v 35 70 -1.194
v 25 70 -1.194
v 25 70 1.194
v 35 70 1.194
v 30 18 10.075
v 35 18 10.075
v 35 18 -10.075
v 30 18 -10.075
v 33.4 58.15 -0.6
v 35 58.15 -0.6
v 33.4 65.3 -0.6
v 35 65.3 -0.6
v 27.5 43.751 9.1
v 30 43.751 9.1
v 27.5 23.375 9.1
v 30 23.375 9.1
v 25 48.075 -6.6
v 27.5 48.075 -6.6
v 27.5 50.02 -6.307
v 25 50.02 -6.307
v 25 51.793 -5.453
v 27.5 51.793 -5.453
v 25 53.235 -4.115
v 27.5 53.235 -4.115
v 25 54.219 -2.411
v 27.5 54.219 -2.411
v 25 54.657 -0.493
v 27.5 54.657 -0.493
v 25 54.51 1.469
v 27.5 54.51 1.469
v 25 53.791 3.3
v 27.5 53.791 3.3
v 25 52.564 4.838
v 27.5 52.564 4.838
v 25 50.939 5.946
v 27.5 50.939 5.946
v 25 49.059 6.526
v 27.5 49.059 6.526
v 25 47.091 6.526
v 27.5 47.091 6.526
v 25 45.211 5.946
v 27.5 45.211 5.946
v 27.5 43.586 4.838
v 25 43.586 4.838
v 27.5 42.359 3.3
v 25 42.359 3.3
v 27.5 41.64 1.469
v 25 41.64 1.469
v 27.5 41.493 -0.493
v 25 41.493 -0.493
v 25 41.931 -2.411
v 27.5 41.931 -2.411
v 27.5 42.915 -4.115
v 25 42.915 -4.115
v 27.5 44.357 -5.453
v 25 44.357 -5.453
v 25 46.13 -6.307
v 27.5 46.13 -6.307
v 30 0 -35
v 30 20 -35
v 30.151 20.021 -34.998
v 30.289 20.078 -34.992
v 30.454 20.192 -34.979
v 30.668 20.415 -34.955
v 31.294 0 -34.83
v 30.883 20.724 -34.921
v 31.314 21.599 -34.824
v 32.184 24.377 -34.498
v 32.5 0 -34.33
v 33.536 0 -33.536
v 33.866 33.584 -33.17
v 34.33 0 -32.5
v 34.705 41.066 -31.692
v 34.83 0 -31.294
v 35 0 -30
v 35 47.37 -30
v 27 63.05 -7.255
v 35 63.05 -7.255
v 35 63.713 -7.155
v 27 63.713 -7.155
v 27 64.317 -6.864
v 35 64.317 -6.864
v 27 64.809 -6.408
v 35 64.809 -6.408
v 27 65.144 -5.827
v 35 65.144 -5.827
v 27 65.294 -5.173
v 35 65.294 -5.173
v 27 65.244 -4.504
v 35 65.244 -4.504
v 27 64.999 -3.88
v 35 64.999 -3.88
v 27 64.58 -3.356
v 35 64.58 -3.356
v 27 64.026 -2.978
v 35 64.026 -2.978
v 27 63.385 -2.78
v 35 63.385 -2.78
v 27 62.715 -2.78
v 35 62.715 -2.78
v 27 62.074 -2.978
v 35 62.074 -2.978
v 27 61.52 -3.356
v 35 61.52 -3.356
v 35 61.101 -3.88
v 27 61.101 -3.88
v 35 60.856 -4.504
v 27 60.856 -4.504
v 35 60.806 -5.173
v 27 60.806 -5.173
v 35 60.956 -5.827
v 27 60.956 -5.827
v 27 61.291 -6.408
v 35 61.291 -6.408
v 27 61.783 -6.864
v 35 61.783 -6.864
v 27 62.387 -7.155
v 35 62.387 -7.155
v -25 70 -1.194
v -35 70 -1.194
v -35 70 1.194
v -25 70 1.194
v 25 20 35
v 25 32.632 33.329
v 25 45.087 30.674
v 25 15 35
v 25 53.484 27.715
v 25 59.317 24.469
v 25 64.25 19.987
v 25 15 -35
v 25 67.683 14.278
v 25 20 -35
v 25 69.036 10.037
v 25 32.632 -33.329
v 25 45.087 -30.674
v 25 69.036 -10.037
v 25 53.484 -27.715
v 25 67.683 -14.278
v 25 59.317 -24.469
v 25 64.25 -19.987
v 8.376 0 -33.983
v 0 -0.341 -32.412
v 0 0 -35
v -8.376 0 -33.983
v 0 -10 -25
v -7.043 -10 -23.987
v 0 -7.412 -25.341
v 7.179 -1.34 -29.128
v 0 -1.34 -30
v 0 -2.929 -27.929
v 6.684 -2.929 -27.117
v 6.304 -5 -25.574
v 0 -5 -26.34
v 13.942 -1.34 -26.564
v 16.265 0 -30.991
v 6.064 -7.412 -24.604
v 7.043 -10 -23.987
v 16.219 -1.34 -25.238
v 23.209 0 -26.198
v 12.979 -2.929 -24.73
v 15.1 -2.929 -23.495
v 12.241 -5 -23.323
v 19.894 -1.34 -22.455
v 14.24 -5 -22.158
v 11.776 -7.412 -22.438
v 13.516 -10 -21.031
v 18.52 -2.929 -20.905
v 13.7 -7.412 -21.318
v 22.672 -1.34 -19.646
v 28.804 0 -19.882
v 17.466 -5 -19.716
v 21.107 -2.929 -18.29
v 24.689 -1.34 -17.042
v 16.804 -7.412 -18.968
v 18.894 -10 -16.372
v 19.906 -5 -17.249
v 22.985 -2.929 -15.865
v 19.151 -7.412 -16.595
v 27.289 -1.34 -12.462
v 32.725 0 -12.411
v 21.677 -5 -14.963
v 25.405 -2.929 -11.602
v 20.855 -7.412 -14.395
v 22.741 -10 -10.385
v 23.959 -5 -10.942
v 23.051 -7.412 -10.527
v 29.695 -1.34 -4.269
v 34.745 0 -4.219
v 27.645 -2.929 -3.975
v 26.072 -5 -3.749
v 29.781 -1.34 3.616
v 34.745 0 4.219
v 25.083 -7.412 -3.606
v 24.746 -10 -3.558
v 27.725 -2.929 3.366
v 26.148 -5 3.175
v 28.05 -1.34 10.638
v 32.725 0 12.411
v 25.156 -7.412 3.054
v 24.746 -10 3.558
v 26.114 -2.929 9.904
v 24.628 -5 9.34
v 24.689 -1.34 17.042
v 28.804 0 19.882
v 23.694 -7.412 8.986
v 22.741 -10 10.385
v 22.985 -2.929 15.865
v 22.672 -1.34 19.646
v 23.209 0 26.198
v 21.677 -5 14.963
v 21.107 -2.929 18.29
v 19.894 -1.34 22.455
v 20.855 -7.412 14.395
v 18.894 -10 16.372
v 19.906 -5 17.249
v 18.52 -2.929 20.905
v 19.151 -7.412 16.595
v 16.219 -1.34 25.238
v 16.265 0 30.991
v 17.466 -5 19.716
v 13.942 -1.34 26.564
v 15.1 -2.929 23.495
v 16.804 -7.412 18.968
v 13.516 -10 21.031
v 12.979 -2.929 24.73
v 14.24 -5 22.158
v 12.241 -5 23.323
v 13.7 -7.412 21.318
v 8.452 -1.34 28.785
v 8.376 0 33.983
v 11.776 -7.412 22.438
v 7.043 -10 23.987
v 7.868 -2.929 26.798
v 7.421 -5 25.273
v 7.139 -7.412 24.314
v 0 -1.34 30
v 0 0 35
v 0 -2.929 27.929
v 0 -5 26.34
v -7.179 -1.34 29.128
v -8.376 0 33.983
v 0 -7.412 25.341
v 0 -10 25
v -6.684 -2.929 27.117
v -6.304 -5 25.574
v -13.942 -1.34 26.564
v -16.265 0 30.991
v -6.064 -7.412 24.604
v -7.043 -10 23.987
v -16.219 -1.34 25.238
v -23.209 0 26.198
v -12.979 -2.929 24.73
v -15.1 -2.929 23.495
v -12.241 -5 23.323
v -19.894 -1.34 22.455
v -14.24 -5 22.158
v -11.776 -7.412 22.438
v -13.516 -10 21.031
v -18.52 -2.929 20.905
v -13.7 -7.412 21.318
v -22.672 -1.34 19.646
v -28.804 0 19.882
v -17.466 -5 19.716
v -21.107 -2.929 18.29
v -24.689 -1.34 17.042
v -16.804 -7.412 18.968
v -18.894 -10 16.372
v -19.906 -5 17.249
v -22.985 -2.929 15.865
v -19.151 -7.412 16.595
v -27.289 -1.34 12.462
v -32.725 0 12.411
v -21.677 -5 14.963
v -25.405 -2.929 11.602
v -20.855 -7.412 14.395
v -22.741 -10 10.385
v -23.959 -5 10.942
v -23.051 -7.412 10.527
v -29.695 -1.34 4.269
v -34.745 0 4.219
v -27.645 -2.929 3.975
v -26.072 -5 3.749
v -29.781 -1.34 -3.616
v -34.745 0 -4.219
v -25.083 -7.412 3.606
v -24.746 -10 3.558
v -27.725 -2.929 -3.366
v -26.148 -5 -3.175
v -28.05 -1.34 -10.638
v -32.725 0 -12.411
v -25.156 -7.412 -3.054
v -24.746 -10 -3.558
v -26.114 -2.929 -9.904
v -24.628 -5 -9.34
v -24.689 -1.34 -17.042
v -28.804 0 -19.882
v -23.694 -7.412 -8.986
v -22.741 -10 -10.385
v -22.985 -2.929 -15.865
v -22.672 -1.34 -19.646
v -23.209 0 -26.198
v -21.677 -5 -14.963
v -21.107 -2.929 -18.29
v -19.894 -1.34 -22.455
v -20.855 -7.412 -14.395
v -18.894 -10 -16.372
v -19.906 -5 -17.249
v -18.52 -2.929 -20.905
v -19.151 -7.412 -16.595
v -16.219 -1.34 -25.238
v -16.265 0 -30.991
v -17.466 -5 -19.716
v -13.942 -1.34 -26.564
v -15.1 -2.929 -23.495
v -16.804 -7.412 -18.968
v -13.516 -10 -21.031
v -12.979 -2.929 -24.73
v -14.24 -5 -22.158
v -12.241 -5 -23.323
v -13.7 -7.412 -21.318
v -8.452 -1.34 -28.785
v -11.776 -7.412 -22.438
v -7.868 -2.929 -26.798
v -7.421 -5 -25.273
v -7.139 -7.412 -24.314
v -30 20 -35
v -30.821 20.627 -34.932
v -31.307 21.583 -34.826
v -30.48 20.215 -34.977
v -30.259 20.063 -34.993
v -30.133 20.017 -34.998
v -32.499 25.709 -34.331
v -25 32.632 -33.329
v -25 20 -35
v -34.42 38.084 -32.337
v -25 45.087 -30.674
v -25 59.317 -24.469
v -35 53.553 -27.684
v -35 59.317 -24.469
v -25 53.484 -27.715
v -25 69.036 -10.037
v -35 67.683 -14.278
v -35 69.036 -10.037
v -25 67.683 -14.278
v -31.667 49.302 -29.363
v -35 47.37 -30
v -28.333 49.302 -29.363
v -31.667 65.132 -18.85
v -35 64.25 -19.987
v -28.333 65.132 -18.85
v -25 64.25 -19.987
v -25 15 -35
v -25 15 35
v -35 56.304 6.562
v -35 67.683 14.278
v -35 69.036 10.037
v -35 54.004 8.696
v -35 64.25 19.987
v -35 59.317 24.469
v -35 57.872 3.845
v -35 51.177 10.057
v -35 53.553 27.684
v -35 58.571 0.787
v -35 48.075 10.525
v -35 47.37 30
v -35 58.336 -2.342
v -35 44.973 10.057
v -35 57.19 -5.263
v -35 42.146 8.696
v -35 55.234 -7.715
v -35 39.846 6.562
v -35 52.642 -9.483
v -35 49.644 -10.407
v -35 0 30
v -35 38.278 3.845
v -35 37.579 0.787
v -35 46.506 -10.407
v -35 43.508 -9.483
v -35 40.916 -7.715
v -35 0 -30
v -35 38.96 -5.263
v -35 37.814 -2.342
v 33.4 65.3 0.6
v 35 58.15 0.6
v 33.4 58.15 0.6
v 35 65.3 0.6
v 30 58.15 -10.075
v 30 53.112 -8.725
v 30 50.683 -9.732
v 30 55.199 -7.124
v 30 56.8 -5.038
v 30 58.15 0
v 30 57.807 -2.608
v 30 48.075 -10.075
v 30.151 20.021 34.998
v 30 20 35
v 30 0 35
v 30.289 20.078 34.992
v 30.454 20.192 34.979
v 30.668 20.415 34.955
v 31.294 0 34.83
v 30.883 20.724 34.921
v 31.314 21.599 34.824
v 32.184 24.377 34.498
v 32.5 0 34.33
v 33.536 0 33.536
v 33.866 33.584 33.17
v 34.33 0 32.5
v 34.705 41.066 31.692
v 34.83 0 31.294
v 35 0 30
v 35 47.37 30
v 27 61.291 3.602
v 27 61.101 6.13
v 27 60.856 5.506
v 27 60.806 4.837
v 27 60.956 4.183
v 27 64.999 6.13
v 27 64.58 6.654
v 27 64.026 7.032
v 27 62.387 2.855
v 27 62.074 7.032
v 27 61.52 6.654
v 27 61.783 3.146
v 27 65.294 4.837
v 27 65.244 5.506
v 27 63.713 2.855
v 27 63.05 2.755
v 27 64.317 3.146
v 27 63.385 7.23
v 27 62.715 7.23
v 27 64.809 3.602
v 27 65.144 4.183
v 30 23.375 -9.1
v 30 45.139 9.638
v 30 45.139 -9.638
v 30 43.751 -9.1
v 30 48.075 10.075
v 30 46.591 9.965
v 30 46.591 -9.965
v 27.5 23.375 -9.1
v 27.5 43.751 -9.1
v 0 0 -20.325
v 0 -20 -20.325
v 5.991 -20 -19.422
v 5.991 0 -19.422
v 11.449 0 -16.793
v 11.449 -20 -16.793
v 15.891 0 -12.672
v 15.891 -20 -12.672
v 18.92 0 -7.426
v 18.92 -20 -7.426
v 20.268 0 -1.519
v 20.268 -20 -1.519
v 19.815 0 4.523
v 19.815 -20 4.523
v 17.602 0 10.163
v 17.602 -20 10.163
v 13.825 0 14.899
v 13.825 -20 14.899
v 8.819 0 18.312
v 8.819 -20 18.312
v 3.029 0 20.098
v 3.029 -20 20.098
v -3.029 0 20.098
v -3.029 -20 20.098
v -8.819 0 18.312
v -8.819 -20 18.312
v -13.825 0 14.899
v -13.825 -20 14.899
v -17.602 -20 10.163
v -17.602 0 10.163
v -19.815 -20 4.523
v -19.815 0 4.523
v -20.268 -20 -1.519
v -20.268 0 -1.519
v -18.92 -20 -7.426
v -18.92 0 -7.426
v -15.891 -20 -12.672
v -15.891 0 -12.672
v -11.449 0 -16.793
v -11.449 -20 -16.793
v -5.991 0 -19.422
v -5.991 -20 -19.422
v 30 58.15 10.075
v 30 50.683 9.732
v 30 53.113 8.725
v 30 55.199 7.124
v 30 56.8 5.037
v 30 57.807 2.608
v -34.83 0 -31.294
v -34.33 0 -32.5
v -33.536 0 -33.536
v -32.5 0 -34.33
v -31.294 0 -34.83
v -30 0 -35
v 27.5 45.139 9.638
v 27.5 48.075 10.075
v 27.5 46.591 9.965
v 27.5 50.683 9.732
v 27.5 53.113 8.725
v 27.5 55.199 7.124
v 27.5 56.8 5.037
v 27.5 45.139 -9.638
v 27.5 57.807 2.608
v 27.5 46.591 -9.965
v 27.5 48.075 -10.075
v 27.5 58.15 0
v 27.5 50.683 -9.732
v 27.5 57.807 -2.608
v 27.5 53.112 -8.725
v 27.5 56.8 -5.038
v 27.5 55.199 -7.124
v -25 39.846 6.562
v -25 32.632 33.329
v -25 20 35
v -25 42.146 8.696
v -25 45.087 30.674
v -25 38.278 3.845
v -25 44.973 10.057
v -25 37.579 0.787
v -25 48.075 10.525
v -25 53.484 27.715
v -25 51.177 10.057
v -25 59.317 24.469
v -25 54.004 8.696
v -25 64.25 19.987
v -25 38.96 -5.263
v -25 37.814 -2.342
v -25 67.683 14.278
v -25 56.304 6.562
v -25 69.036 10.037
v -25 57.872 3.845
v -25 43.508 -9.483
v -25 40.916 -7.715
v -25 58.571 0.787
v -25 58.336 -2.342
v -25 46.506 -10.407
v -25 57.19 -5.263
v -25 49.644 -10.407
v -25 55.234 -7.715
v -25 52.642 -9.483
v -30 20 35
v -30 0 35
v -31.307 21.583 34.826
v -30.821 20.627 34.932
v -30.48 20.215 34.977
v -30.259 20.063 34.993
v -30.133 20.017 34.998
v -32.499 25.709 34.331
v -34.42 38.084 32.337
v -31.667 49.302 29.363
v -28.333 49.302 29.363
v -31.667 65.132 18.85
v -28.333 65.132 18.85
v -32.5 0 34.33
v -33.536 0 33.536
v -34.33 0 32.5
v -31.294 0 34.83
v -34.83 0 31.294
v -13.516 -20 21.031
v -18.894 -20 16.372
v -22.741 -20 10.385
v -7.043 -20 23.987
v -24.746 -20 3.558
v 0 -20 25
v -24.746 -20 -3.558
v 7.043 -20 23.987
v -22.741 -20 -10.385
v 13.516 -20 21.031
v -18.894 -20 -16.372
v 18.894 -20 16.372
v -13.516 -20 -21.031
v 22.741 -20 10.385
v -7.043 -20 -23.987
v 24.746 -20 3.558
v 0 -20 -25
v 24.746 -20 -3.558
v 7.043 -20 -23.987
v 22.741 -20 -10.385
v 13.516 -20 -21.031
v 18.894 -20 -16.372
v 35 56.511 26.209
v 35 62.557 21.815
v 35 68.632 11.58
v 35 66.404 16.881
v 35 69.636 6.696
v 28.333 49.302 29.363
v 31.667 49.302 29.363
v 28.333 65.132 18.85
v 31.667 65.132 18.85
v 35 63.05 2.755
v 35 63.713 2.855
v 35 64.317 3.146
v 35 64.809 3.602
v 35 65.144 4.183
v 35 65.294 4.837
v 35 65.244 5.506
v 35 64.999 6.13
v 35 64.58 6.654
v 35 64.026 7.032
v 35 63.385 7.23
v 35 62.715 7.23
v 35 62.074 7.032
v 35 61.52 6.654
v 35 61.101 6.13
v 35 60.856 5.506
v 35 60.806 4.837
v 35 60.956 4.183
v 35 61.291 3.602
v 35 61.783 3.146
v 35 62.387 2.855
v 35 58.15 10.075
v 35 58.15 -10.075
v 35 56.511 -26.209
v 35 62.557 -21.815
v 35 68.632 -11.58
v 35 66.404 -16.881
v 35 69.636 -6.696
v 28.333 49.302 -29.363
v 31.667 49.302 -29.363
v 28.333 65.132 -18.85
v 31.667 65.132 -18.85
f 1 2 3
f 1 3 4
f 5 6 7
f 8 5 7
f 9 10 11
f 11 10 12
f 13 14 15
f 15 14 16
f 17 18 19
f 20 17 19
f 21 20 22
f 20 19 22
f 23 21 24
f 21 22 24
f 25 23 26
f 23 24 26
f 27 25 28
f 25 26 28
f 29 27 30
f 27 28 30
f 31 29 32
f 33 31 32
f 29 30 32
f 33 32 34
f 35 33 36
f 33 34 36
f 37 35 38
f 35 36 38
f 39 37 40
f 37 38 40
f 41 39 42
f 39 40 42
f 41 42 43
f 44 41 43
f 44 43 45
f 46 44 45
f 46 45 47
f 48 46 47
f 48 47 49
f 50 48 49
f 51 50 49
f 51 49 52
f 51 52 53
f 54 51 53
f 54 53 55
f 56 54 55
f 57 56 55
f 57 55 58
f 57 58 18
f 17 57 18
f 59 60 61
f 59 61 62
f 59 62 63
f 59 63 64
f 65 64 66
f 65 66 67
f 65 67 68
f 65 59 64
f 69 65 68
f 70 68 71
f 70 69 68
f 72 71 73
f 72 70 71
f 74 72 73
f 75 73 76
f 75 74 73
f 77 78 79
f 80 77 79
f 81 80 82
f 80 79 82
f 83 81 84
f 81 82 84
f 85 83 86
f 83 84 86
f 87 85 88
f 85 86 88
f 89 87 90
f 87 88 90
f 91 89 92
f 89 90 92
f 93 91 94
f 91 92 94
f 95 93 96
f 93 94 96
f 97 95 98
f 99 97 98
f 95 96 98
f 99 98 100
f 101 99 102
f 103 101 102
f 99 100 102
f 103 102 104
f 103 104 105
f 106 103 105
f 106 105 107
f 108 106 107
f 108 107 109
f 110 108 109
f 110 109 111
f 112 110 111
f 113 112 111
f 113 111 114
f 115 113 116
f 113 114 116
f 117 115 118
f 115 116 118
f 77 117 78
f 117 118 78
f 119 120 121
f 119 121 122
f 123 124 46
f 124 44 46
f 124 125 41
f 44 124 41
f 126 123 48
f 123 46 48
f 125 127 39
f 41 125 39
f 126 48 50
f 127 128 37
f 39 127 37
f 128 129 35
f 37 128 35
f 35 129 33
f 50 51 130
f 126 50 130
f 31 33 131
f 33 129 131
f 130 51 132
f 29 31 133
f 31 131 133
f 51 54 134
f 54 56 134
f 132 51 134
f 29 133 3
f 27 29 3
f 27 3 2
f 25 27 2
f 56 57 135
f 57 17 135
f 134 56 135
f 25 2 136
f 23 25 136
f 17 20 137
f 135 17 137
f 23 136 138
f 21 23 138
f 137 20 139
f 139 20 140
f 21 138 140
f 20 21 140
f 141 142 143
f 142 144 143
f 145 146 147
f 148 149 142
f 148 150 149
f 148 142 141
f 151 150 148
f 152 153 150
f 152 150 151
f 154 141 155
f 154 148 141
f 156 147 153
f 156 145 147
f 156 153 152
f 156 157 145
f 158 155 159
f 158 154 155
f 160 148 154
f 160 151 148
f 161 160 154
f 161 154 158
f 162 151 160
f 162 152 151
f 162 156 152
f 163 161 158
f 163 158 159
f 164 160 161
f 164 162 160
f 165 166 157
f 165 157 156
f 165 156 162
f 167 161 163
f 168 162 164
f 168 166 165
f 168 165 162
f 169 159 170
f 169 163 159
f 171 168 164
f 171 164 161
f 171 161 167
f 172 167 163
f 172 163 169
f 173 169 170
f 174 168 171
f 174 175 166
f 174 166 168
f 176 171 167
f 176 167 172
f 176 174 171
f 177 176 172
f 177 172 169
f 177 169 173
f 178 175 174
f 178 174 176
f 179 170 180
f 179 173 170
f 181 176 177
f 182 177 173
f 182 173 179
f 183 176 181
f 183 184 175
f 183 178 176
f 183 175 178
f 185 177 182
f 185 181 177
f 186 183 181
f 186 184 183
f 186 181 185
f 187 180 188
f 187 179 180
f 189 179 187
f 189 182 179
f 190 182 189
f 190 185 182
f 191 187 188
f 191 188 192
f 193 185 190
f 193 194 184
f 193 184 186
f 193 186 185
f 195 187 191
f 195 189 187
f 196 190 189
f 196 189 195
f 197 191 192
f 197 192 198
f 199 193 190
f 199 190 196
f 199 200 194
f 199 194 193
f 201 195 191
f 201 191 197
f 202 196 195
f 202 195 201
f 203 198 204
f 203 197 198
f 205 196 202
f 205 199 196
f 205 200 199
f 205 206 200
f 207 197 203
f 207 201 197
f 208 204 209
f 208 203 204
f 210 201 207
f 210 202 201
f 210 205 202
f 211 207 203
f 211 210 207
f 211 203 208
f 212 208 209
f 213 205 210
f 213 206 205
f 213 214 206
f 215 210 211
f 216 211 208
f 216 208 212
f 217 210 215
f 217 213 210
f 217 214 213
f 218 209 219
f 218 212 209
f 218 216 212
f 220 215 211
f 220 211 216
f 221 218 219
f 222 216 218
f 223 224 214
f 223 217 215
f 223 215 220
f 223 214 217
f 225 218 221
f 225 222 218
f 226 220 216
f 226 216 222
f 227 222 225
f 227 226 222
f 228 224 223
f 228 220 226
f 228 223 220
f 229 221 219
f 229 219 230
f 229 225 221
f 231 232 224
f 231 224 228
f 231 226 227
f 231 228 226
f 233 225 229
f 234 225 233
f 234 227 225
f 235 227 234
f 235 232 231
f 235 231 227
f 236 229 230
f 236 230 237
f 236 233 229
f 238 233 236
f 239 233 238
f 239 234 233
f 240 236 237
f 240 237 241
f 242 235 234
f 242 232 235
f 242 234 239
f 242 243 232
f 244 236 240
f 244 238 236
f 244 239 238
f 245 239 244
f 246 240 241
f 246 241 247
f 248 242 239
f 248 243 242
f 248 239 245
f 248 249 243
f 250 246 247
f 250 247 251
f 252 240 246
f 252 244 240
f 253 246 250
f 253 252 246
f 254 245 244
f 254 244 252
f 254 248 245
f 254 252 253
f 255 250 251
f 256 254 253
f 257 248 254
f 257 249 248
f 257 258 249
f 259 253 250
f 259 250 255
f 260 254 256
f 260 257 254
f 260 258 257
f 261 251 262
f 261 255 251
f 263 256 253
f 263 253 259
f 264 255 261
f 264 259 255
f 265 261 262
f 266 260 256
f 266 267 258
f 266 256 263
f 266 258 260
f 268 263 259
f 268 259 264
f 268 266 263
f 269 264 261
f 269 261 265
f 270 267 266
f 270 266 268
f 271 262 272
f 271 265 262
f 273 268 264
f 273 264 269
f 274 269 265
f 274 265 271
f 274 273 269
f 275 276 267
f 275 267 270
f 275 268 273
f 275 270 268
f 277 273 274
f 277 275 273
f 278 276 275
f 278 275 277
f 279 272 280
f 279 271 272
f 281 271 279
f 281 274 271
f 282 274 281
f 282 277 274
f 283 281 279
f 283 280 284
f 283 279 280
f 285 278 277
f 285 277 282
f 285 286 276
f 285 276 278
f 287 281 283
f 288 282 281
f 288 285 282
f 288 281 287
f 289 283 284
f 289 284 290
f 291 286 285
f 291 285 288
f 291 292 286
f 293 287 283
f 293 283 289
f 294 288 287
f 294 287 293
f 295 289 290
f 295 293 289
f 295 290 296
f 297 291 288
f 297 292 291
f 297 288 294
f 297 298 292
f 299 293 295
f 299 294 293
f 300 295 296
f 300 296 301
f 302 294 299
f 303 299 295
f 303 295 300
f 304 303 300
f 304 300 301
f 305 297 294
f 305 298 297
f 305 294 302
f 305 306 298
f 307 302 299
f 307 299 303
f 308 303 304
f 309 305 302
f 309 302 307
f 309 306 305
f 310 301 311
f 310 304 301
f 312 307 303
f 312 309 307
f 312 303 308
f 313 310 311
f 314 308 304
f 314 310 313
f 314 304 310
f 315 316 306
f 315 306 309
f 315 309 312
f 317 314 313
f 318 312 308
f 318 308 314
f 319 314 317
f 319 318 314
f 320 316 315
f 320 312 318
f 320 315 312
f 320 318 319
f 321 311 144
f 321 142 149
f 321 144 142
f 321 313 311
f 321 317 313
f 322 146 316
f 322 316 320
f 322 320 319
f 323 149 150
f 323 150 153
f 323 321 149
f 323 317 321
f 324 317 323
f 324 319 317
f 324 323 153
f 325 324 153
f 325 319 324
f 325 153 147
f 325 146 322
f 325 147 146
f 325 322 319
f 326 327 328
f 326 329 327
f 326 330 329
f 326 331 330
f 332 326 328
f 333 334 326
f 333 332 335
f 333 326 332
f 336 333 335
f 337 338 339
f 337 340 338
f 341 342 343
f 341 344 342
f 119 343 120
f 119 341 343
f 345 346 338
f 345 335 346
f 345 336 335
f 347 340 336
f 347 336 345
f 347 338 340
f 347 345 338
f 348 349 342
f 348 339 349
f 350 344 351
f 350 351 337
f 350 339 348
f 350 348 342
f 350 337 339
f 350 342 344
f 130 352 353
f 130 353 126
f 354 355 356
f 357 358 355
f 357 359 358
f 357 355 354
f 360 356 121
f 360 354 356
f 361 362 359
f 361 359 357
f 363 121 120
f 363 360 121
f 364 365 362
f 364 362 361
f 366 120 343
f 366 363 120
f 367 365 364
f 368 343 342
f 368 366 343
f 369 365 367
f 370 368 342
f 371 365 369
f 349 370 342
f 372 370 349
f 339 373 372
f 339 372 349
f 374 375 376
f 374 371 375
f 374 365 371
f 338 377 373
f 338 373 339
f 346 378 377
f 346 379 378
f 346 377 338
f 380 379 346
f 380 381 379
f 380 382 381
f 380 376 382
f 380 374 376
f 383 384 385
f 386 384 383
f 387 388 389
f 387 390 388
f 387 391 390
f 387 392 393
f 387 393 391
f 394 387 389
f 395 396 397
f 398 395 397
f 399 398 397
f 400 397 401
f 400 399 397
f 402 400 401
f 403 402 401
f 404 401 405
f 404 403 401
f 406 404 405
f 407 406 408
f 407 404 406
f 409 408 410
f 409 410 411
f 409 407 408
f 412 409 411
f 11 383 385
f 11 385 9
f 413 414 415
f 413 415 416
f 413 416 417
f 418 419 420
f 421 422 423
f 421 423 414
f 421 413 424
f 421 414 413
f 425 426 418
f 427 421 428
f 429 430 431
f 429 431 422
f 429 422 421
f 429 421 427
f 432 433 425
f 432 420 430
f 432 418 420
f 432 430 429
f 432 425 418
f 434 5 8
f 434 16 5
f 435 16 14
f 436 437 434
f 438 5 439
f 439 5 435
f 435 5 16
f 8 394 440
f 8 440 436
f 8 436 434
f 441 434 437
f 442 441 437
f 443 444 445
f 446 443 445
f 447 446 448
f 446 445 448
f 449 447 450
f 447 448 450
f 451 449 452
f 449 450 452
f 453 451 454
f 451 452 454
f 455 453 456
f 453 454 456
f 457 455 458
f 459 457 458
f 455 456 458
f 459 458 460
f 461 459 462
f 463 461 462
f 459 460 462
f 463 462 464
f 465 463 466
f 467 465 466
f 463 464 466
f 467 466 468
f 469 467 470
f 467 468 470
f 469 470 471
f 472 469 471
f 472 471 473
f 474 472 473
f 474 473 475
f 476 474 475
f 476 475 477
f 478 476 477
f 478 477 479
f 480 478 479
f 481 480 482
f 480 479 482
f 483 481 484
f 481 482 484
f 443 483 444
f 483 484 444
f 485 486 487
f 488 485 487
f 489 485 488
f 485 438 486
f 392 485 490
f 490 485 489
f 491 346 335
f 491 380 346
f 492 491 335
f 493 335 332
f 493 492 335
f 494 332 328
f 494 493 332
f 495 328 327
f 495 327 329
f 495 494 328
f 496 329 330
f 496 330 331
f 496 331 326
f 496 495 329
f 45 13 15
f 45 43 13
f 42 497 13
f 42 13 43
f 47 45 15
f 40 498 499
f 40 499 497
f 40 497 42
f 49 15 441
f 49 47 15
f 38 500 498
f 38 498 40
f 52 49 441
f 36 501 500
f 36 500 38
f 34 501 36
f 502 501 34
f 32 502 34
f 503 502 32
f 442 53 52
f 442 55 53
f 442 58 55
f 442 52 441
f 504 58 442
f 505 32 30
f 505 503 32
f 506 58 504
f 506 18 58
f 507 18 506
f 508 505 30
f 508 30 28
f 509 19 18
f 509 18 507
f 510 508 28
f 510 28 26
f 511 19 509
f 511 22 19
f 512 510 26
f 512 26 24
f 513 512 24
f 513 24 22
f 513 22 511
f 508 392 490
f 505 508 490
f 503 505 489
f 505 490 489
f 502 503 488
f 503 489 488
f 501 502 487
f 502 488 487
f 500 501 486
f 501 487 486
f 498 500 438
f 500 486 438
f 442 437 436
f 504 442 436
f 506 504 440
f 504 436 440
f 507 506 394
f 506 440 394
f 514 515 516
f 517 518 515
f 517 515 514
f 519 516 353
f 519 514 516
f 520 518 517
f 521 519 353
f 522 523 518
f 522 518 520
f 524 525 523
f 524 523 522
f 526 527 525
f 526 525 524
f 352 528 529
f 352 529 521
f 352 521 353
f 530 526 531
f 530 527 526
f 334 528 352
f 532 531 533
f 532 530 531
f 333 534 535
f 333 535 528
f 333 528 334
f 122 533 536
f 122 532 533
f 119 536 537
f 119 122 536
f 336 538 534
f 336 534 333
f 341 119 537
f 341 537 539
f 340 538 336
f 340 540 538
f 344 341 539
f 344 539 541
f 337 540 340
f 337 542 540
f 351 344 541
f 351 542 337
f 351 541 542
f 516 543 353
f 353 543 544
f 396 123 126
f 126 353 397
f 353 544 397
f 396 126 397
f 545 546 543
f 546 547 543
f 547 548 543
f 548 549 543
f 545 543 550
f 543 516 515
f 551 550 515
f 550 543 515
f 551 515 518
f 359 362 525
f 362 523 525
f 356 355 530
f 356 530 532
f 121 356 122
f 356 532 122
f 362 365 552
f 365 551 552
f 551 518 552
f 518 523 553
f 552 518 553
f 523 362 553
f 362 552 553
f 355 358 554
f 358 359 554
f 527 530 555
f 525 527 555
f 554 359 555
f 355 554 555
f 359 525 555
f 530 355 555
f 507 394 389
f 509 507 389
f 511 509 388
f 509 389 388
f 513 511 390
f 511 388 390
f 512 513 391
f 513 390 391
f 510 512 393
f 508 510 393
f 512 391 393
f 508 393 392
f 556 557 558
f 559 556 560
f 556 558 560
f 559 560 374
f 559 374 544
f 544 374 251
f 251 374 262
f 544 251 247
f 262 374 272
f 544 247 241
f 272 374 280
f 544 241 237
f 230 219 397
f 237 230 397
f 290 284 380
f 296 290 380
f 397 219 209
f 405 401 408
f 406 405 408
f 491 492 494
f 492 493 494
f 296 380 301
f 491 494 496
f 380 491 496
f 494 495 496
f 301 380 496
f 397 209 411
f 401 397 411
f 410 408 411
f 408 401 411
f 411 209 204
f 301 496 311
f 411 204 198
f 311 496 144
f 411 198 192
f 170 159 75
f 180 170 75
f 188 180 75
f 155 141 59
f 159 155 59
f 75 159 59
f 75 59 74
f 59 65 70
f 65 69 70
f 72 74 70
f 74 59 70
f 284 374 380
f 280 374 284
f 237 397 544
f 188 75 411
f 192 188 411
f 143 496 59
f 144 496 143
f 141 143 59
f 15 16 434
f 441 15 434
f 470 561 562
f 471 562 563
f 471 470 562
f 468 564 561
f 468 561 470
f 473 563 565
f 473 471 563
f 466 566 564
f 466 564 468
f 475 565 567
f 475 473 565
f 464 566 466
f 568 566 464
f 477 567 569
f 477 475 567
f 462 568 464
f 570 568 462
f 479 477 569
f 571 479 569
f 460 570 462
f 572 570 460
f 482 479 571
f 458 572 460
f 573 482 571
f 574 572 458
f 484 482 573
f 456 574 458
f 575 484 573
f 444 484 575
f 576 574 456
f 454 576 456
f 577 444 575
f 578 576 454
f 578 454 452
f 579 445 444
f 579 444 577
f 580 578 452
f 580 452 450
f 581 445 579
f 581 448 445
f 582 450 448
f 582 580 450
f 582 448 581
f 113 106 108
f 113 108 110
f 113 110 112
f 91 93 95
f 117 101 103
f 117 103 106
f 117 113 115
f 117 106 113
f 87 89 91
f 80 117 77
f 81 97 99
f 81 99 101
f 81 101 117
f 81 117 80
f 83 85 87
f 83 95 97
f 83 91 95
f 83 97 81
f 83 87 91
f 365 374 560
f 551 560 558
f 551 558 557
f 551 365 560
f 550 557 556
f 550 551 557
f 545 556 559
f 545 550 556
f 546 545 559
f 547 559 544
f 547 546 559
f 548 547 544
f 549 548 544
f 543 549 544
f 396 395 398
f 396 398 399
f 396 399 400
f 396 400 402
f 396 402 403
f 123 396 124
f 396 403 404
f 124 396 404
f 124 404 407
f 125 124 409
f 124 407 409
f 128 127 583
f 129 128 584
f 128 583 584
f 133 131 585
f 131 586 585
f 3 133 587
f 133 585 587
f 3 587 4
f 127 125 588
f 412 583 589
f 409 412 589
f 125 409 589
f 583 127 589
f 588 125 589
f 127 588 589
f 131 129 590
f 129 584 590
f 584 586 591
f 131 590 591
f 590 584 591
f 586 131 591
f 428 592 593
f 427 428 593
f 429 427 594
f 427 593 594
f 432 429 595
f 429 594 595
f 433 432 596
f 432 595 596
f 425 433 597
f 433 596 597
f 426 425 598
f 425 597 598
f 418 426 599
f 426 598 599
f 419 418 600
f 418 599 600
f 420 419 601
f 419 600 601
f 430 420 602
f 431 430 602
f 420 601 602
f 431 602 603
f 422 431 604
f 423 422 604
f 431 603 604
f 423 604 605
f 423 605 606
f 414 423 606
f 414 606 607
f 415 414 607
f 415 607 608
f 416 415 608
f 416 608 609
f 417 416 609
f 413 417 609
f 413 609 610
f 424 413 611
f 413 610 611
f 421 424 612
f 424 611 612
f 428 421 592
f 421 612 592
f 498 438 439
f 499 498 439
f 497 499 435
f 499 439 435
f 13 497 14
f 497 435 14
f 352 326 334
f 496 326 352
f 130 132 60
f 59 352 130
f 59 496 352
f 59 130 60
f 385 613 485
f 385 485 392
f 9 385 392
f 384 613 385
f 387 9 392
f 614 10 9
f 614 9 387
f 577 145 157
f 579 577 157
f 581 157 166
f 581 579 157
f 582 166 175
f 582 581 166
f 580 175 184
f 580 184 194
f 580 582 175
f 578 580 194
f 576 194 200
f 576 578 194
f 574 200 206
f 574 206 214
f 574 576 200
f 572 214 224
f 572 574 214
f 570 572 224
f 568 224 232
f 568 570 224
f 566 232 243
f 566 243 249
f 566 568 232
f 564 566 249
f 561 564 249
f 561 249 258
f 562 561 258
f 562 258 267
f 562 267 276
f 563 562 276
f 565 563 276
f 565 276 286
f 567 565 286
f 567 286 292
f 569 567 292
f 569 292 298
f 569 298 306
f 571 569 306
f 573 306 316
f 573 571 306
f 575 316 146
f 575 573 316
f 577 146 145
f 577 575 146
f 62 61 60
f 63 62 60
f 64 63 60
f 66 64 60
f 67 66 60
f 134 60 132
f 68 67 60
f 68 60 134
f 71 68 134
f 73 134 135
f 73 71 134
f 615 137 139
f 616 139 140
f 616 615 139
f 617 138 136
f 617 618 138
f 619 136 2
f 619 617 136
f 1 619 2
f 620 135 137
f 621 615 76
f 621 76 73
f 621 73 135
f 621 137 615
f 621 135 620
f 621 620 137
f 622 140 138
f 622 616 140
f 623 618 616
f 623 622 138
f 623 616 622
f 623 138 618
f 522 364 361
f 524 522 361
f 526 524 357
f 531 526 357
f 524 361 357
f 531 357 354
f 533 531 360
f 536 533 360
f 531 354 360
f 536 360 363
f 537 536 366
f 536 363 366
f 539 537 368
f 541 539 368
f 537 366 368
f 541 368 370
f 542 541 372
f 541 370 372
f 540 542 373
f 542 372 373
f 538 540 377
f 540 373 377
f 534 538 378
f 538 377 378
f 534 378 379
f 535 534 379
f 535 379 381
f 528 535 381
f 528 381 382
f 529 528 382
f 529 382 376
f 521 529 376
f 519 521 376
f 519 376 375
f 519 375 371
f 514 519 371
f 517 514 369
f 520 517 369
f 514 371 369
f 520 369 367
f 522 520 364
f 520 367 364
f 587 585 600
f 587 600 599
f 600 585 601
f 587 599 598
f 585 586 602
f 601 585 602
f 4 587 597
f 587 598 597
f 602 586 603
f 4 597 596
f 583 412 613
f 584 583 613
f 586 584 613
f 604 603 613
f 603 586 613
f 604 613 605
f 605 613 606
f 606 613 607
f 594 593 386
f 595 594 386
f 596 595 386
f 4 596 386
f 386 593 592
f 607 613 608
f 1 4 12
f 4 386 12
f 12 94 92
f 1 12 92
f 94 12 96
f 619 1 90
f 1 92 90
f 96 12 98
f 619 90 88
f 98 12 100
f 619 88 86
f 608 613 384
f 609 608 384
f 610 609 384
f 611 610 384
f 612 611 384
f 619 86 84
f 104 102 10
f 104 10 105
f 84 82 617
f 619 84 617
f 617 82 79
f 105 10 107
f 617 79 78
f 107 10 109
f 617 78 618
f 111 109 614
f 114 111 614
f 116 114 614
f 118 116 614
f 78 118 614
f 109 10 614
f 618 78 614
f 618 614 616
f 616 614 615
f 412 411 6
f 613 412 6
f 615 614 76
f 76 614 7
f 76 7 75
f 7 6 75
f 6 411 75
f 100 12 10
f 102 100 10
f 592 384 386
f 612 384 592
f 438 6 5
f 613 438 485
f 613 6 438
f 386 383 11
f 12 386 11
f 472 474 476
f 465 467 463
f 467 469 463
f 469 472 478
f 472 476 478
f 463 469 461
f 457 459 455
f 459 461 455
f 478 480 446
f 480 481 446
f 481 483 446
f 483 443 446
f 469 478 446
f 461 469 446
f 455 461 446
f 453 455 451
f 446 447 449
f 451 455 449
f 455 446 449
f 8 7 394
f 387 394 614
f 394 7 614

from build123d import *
from build123d.topology import SkipClean

# Parameters (mm, degrees)
SKETCH1_W           = 70
SKETCH1_H           = 70
BOSS_EXTRUDE1_DEPTH = 20
SKETCH3_W           = 10
SKETCH3_H           = 70
BOSS_EXTRUDE2_DEPTH = 50
SKETCH4_R           = 25
SKETCH4_R_2         = 20.325
BOSS_EXTRUDE3_DEPTH = 20
FILLET1_R           = 10
SKETCH5_W           = 20.15
SKETCH5_H           = 40.15
CUT_EXTRUDE1_DEPTH  = 5
CUT_EXTRUDE3_DEPTH  = 140
CUT_EXTRUDE4_DEPTH  = 2.5
SKETCH9_W           = 50
SKETCH9_H           = 70
CUT_EXTRUDE5_DEPTH  = 5
SKETCH8_4_R         = 6.6
SKETCH8_4_R_2       = 3.1
CUT_EXTRUDE8_DEPTH  = 6
SKETCH12_R          = 2.25
CUT_EXTRUDE9_DEPTH  = 8
SKETCH12_3_W        = 1.2
SKETCH12_3_H        = 7.15
CUT_EXTRUDE10_DEPTH = 1.6
SKETCH8_5_R         = 3.1
CUT_EXTRUDE11_DEPTH = 10
SKETCH13_R          = 10.525
CUT_EXTRUDE12_DEPTH = 10
FILLET2_R           = 5


with BuildPart() as part:
    # Sketch1 → Boss-Extrude1 (new body)
    with BuildSketch(Plane(origin=(0, 0, 0), x_dir=(1, 0, 0), z_dir=(0, 1, 0))):
        Rectangle(SKETCH1_W, SKETCH1_H)
    extrude(amount=BOSS_EXTRUDE1_DEPTH)

    # Sketch3 → Boss-Extrude2 (add)
    with BuildSketch(Plane(origin=(0, 20, 0), x_dir=(1, 0, 0), z_dir=(0, 1, 0))):
        with Locations((-30, 0)):
            Rectangle(SKETCH3_W, SKETCH3_H)
        with Locations((30, 0)):
            Rectangle(SKETCH3_W, SKETCH3_H)
    extrude(amount=BOSS_EXTRUDE2_DEPTH)

    # Sketch4 → Boss-Extrude3 (add)
    with BuildSketch(Plane(origin=(0, -20, 0), x_dir=(-1, 0, 0), z_dir=(0, -1, 0))):
        with Locations(Location((0, 0, 0), (0, 0, 90))):
            Circle(SKETCH4_R)
        with Locations(Location((0, 0, 0), (0, 0, 90))):
            Circle(SKETCH4_R_2, mode=Mode.SUBTRACT)
    extrude(amount=-BOSS_EXTRUDE3_DEPTH)

    # Fillet1
    fillet1_edges = [part.edges().sort_by_distance(p)[0] for p in [
        (0, 0, 25),
    ]]
    fillet(fillet1_edges, radius=FILLET1_R - 0.0001)  # a hair under: the kernel refuses the full size

    # Sketch5 → Cut-Extrude1 (cut)
    with BuildSketch(Plane(origin=(35, 0, 0), x_dir=(0, 0, -1), z_dir=(1, 0, 0))):
        with Locations((0, 38.075)):
            Rectangle(SKETCH5_W, SKETCH5_H)
    extrude(amount=-CUT_EXTRUDE1_DEPTH, mode=Mode.SUBTRACT)

    # Sketch6 → Cut-Extrude3 (cut)
    with BuildSketch(Plane(origin=(35, 0, 0), x_dir=(0, 0, -1), z_dir=(1, 0, 0))):
        with BuildLine():
            Line((-35, 70), (-35, 20))
            add(Edge.make_bspline(
                [(-35, 20), (-31.043970013, 56.876347524), (-23.178818695, 69.774444442), (-1.193819381, 70)],
                knots=[0, 0, 0, 0, 0.690984823, 0.690984823, 0.690984823, 0.690984823], degree=3))
            Line((-1.193819381, 70), (-35, 70))
        make_face()
        with BuildLine():
            add(Edge.make_bspline(
                [(35, 20), (31.043970013, 56.876347524), (23.178818695, 69.774444442), (1.193819381, 70)],
                knots=[0, 0, 0, 0, 0.690984823, 0.690984823, 0.690984823, 0.690984823], degree=3))
            Line((35, 20), (35, 70))
            Line((35, 70), (1.193819381, 70))
        make_face()
    extrude(amount=-CUT_EXTRUDE3_DEPTH, mode=Mode.SUBTRACT)

    # Sketch8 → Cut-Extrude4 (cut)
    with BuildSketch(Plane(origin=(30, 0, 0), x_dir=(0, 0, -1), z_dir=(1, 0, 0))):
        with BuildLine():
            ThreePointArc((10.075, 48.075), (7.124100826, 55.199100815), (1.7e-08, 58.15))
            ThreePointArc((1.7e-08, 58.15), (-7.124100815, 55.199100826), (-10.075, 48.075))
            ThreePointArc((-10.075, 48.075), (-9.828227841, 45.858795474), (-9.1, 43.751156224))
            Line((-9.1, 43.751156224), (-9.1, 48.075))
            Line((-9.1, 48.075), (-6.6, 48.075))
            ThreePointArc((-6.6, 48.075), (0, 54.675), (6.6, 48.075))
            Line((6.6, 48.075), (9.1, 48.075))
            Line((9.1, 48.075), (9.1, 43.751156224))
            ThreePointArc((9.1, 43.751156224), (9.828227841, 45.858795474), (10.075, 48.075))
        make_face()
        with BuildLine():
            Line((-9.1, 48.075), (-9.1, 43.751156224))
            ThreePointArc((-9.1, 43.751156224), (0, 38), (9.1, 43.751156224))
            Line((9.1, 43.751156224), (9.1, 48.075))
            Line((9.1, 48.075), (6.6, 48.075))
            ThreePointArc((6.6, 48.075), (0, 41.475), (-6.6, 48.075))
            Line((-6.6, 48.075), (-9.1, 48.075))
        make_face()
        with BuildLine():
            ThreePointArc((9.1, 43.751156224), (0, 38), (-9.1, 43.751156224))
            Line((-9.1, 43.751156224), (-9.1, 23.375))
            Line((-9.1, 23.375), (9.1, 23.375))
            Line((9.1, 23.375), (9.1, 43.751156224))
        make_face()
        with BuildLine():
            ThreePointArc((6.6, 48.075), (0, 54.675), (-6.6, 48.075))
            Line((-6.6, 48.075), (-3.1, 48.075))
            ThreePointArc((-3.1, 48.075), (0, 51.175), (3.1, 48.075))
            Line((3.1, 48.075), (6.6, 48.075))
        make_face()
        with BuildLine():
            Line((-3.1, 48.075), (-6.6, 48.075))
            ThreePointArc((-6.6, 48.075), (0, 41.475), (6.6, 48.075))
            Line((6.6, 48.075), (3.1, 48.075))
            ThreePointArc((3.1, 48.075), (0, 44.975), (-3.1, 48.075))
        make_face()
    extrude(amount=-CUT_EXTRUDE4_DEPTH, mode=Mode.SUBTRACT)

    # Sketch9 → Cut-Extrude5 (cut)
    with BuildSketch(Plane(origin=(0, 20, 0), x_dir=(1, 0, 0), z_dir=(0, 1, 0))):
        Rectangle(SKETCH9_W, SKETCH9_H)
    extrude(amount=-CUT_EXTRUDE5_DEPTH, mode=Mode.SUBTRACT)

    # Sketch8<4> → Cut-Extrude8 (cut)
    with SkipClean():  # the faces are left unmerged after this step: merging them gives an invalid solid
        with BuildSketch(Plane(origin=(30, 0, 0), x_dir=(0, 0, -1), z_dir=(1, 0, 0))):
            with Locations((0, 48.075)):
                Circle(SKETCH8_4_R)
            with Locations((0, 48.075)):
                Circle(SKETCH8_4_R_2, mode=Mode.SUBTRACT)
        extrude(amount=-CUT_EXTRUDE8_DEPTH, mode=Mode.SUBTRACT)


with BuildPart() as cut_extrude8_piece_1:
    # of the separate pieces the step leaves, piece 1, a body of its own (cut_extrude8_pieces)
    add(part.part.solids().sort_by_distance((0, 0, -34.9999))[0])

    # Sketch12 → Cut-Extrude9 (cut)
    with BuildSketch(Plane(origin=(35, 0, 0), x_dir=(0, 0, -1), z_dir=(1, 0, 0))):
        with Locations((-5.005, 63.05)):
            Circle(SKETCH12_R)
        with Locations((5.005, 63.05)):
            Circle(SKETCH12_R)
    extrude(amount=-CUT_EXTRUDE9_DEPTH, mode=Mode.SUBTRACT)

    # Sketch12<3> → Cut-Extrude10 (cut)
    with BuildSketch(Plane(origin=(35, 0, 0), x_dir=(0, 0, -1), z_dir=(1, 0, 0))):
        with Locations((0, 61.725)):
            Rectangle(SKETCH12_3_W, SKETCH12_3_H)
    extrude(amount=-CUT_EXTRUDE10_DEPTH, mode=Mode.SUBTRACT)

    # Sketch13 → Cut-Extrude12 (cut)
    with BuildSketch(Plane.ZY.offset(35)):
        with Locations((0, 48.075)):
            Circle(SKETCH13_R)
    extrude(amount=-CUT_EXTRUDE12_DEPTH, mode=Mode.SUBTRACT)

    # Fillet2
    fillet2_edges = [cut_extrude8_piece_1.edges().sort_by_distance(p)[0] for p in [
        (-35, 10, 35),
        (35, 10, 35),
        (35, 10, -35),
        (-35, 10, -35),
    ]]
    fillet(fillet2_edges, radius=FILLET2_R)


with BuildPart() as cut_extrude8_piece_2:
    # of the separate pieces the step leaves, piece 2, a body of its own (cut_extrude8_pieces)
    add(part.part.solids().sort_by_distance((25, 48.075, -3.1))[0])

    # Sketch8<5> → Cut-Extrude11 (cut)
    with BuildSketch(Plane(origin=(30, 0, 0), x_dir=(0, 0, -1), z_dir=(1, 0, 0))):
        with Locations((0, 48.075)):
            Circle(SKETCH8_5_R)
    extrude(amount=-CUT_EXTRUDE11_DEPTH, mode=Mode.SUBTRACT)


solid = cut_extrude8_piece_1.part
